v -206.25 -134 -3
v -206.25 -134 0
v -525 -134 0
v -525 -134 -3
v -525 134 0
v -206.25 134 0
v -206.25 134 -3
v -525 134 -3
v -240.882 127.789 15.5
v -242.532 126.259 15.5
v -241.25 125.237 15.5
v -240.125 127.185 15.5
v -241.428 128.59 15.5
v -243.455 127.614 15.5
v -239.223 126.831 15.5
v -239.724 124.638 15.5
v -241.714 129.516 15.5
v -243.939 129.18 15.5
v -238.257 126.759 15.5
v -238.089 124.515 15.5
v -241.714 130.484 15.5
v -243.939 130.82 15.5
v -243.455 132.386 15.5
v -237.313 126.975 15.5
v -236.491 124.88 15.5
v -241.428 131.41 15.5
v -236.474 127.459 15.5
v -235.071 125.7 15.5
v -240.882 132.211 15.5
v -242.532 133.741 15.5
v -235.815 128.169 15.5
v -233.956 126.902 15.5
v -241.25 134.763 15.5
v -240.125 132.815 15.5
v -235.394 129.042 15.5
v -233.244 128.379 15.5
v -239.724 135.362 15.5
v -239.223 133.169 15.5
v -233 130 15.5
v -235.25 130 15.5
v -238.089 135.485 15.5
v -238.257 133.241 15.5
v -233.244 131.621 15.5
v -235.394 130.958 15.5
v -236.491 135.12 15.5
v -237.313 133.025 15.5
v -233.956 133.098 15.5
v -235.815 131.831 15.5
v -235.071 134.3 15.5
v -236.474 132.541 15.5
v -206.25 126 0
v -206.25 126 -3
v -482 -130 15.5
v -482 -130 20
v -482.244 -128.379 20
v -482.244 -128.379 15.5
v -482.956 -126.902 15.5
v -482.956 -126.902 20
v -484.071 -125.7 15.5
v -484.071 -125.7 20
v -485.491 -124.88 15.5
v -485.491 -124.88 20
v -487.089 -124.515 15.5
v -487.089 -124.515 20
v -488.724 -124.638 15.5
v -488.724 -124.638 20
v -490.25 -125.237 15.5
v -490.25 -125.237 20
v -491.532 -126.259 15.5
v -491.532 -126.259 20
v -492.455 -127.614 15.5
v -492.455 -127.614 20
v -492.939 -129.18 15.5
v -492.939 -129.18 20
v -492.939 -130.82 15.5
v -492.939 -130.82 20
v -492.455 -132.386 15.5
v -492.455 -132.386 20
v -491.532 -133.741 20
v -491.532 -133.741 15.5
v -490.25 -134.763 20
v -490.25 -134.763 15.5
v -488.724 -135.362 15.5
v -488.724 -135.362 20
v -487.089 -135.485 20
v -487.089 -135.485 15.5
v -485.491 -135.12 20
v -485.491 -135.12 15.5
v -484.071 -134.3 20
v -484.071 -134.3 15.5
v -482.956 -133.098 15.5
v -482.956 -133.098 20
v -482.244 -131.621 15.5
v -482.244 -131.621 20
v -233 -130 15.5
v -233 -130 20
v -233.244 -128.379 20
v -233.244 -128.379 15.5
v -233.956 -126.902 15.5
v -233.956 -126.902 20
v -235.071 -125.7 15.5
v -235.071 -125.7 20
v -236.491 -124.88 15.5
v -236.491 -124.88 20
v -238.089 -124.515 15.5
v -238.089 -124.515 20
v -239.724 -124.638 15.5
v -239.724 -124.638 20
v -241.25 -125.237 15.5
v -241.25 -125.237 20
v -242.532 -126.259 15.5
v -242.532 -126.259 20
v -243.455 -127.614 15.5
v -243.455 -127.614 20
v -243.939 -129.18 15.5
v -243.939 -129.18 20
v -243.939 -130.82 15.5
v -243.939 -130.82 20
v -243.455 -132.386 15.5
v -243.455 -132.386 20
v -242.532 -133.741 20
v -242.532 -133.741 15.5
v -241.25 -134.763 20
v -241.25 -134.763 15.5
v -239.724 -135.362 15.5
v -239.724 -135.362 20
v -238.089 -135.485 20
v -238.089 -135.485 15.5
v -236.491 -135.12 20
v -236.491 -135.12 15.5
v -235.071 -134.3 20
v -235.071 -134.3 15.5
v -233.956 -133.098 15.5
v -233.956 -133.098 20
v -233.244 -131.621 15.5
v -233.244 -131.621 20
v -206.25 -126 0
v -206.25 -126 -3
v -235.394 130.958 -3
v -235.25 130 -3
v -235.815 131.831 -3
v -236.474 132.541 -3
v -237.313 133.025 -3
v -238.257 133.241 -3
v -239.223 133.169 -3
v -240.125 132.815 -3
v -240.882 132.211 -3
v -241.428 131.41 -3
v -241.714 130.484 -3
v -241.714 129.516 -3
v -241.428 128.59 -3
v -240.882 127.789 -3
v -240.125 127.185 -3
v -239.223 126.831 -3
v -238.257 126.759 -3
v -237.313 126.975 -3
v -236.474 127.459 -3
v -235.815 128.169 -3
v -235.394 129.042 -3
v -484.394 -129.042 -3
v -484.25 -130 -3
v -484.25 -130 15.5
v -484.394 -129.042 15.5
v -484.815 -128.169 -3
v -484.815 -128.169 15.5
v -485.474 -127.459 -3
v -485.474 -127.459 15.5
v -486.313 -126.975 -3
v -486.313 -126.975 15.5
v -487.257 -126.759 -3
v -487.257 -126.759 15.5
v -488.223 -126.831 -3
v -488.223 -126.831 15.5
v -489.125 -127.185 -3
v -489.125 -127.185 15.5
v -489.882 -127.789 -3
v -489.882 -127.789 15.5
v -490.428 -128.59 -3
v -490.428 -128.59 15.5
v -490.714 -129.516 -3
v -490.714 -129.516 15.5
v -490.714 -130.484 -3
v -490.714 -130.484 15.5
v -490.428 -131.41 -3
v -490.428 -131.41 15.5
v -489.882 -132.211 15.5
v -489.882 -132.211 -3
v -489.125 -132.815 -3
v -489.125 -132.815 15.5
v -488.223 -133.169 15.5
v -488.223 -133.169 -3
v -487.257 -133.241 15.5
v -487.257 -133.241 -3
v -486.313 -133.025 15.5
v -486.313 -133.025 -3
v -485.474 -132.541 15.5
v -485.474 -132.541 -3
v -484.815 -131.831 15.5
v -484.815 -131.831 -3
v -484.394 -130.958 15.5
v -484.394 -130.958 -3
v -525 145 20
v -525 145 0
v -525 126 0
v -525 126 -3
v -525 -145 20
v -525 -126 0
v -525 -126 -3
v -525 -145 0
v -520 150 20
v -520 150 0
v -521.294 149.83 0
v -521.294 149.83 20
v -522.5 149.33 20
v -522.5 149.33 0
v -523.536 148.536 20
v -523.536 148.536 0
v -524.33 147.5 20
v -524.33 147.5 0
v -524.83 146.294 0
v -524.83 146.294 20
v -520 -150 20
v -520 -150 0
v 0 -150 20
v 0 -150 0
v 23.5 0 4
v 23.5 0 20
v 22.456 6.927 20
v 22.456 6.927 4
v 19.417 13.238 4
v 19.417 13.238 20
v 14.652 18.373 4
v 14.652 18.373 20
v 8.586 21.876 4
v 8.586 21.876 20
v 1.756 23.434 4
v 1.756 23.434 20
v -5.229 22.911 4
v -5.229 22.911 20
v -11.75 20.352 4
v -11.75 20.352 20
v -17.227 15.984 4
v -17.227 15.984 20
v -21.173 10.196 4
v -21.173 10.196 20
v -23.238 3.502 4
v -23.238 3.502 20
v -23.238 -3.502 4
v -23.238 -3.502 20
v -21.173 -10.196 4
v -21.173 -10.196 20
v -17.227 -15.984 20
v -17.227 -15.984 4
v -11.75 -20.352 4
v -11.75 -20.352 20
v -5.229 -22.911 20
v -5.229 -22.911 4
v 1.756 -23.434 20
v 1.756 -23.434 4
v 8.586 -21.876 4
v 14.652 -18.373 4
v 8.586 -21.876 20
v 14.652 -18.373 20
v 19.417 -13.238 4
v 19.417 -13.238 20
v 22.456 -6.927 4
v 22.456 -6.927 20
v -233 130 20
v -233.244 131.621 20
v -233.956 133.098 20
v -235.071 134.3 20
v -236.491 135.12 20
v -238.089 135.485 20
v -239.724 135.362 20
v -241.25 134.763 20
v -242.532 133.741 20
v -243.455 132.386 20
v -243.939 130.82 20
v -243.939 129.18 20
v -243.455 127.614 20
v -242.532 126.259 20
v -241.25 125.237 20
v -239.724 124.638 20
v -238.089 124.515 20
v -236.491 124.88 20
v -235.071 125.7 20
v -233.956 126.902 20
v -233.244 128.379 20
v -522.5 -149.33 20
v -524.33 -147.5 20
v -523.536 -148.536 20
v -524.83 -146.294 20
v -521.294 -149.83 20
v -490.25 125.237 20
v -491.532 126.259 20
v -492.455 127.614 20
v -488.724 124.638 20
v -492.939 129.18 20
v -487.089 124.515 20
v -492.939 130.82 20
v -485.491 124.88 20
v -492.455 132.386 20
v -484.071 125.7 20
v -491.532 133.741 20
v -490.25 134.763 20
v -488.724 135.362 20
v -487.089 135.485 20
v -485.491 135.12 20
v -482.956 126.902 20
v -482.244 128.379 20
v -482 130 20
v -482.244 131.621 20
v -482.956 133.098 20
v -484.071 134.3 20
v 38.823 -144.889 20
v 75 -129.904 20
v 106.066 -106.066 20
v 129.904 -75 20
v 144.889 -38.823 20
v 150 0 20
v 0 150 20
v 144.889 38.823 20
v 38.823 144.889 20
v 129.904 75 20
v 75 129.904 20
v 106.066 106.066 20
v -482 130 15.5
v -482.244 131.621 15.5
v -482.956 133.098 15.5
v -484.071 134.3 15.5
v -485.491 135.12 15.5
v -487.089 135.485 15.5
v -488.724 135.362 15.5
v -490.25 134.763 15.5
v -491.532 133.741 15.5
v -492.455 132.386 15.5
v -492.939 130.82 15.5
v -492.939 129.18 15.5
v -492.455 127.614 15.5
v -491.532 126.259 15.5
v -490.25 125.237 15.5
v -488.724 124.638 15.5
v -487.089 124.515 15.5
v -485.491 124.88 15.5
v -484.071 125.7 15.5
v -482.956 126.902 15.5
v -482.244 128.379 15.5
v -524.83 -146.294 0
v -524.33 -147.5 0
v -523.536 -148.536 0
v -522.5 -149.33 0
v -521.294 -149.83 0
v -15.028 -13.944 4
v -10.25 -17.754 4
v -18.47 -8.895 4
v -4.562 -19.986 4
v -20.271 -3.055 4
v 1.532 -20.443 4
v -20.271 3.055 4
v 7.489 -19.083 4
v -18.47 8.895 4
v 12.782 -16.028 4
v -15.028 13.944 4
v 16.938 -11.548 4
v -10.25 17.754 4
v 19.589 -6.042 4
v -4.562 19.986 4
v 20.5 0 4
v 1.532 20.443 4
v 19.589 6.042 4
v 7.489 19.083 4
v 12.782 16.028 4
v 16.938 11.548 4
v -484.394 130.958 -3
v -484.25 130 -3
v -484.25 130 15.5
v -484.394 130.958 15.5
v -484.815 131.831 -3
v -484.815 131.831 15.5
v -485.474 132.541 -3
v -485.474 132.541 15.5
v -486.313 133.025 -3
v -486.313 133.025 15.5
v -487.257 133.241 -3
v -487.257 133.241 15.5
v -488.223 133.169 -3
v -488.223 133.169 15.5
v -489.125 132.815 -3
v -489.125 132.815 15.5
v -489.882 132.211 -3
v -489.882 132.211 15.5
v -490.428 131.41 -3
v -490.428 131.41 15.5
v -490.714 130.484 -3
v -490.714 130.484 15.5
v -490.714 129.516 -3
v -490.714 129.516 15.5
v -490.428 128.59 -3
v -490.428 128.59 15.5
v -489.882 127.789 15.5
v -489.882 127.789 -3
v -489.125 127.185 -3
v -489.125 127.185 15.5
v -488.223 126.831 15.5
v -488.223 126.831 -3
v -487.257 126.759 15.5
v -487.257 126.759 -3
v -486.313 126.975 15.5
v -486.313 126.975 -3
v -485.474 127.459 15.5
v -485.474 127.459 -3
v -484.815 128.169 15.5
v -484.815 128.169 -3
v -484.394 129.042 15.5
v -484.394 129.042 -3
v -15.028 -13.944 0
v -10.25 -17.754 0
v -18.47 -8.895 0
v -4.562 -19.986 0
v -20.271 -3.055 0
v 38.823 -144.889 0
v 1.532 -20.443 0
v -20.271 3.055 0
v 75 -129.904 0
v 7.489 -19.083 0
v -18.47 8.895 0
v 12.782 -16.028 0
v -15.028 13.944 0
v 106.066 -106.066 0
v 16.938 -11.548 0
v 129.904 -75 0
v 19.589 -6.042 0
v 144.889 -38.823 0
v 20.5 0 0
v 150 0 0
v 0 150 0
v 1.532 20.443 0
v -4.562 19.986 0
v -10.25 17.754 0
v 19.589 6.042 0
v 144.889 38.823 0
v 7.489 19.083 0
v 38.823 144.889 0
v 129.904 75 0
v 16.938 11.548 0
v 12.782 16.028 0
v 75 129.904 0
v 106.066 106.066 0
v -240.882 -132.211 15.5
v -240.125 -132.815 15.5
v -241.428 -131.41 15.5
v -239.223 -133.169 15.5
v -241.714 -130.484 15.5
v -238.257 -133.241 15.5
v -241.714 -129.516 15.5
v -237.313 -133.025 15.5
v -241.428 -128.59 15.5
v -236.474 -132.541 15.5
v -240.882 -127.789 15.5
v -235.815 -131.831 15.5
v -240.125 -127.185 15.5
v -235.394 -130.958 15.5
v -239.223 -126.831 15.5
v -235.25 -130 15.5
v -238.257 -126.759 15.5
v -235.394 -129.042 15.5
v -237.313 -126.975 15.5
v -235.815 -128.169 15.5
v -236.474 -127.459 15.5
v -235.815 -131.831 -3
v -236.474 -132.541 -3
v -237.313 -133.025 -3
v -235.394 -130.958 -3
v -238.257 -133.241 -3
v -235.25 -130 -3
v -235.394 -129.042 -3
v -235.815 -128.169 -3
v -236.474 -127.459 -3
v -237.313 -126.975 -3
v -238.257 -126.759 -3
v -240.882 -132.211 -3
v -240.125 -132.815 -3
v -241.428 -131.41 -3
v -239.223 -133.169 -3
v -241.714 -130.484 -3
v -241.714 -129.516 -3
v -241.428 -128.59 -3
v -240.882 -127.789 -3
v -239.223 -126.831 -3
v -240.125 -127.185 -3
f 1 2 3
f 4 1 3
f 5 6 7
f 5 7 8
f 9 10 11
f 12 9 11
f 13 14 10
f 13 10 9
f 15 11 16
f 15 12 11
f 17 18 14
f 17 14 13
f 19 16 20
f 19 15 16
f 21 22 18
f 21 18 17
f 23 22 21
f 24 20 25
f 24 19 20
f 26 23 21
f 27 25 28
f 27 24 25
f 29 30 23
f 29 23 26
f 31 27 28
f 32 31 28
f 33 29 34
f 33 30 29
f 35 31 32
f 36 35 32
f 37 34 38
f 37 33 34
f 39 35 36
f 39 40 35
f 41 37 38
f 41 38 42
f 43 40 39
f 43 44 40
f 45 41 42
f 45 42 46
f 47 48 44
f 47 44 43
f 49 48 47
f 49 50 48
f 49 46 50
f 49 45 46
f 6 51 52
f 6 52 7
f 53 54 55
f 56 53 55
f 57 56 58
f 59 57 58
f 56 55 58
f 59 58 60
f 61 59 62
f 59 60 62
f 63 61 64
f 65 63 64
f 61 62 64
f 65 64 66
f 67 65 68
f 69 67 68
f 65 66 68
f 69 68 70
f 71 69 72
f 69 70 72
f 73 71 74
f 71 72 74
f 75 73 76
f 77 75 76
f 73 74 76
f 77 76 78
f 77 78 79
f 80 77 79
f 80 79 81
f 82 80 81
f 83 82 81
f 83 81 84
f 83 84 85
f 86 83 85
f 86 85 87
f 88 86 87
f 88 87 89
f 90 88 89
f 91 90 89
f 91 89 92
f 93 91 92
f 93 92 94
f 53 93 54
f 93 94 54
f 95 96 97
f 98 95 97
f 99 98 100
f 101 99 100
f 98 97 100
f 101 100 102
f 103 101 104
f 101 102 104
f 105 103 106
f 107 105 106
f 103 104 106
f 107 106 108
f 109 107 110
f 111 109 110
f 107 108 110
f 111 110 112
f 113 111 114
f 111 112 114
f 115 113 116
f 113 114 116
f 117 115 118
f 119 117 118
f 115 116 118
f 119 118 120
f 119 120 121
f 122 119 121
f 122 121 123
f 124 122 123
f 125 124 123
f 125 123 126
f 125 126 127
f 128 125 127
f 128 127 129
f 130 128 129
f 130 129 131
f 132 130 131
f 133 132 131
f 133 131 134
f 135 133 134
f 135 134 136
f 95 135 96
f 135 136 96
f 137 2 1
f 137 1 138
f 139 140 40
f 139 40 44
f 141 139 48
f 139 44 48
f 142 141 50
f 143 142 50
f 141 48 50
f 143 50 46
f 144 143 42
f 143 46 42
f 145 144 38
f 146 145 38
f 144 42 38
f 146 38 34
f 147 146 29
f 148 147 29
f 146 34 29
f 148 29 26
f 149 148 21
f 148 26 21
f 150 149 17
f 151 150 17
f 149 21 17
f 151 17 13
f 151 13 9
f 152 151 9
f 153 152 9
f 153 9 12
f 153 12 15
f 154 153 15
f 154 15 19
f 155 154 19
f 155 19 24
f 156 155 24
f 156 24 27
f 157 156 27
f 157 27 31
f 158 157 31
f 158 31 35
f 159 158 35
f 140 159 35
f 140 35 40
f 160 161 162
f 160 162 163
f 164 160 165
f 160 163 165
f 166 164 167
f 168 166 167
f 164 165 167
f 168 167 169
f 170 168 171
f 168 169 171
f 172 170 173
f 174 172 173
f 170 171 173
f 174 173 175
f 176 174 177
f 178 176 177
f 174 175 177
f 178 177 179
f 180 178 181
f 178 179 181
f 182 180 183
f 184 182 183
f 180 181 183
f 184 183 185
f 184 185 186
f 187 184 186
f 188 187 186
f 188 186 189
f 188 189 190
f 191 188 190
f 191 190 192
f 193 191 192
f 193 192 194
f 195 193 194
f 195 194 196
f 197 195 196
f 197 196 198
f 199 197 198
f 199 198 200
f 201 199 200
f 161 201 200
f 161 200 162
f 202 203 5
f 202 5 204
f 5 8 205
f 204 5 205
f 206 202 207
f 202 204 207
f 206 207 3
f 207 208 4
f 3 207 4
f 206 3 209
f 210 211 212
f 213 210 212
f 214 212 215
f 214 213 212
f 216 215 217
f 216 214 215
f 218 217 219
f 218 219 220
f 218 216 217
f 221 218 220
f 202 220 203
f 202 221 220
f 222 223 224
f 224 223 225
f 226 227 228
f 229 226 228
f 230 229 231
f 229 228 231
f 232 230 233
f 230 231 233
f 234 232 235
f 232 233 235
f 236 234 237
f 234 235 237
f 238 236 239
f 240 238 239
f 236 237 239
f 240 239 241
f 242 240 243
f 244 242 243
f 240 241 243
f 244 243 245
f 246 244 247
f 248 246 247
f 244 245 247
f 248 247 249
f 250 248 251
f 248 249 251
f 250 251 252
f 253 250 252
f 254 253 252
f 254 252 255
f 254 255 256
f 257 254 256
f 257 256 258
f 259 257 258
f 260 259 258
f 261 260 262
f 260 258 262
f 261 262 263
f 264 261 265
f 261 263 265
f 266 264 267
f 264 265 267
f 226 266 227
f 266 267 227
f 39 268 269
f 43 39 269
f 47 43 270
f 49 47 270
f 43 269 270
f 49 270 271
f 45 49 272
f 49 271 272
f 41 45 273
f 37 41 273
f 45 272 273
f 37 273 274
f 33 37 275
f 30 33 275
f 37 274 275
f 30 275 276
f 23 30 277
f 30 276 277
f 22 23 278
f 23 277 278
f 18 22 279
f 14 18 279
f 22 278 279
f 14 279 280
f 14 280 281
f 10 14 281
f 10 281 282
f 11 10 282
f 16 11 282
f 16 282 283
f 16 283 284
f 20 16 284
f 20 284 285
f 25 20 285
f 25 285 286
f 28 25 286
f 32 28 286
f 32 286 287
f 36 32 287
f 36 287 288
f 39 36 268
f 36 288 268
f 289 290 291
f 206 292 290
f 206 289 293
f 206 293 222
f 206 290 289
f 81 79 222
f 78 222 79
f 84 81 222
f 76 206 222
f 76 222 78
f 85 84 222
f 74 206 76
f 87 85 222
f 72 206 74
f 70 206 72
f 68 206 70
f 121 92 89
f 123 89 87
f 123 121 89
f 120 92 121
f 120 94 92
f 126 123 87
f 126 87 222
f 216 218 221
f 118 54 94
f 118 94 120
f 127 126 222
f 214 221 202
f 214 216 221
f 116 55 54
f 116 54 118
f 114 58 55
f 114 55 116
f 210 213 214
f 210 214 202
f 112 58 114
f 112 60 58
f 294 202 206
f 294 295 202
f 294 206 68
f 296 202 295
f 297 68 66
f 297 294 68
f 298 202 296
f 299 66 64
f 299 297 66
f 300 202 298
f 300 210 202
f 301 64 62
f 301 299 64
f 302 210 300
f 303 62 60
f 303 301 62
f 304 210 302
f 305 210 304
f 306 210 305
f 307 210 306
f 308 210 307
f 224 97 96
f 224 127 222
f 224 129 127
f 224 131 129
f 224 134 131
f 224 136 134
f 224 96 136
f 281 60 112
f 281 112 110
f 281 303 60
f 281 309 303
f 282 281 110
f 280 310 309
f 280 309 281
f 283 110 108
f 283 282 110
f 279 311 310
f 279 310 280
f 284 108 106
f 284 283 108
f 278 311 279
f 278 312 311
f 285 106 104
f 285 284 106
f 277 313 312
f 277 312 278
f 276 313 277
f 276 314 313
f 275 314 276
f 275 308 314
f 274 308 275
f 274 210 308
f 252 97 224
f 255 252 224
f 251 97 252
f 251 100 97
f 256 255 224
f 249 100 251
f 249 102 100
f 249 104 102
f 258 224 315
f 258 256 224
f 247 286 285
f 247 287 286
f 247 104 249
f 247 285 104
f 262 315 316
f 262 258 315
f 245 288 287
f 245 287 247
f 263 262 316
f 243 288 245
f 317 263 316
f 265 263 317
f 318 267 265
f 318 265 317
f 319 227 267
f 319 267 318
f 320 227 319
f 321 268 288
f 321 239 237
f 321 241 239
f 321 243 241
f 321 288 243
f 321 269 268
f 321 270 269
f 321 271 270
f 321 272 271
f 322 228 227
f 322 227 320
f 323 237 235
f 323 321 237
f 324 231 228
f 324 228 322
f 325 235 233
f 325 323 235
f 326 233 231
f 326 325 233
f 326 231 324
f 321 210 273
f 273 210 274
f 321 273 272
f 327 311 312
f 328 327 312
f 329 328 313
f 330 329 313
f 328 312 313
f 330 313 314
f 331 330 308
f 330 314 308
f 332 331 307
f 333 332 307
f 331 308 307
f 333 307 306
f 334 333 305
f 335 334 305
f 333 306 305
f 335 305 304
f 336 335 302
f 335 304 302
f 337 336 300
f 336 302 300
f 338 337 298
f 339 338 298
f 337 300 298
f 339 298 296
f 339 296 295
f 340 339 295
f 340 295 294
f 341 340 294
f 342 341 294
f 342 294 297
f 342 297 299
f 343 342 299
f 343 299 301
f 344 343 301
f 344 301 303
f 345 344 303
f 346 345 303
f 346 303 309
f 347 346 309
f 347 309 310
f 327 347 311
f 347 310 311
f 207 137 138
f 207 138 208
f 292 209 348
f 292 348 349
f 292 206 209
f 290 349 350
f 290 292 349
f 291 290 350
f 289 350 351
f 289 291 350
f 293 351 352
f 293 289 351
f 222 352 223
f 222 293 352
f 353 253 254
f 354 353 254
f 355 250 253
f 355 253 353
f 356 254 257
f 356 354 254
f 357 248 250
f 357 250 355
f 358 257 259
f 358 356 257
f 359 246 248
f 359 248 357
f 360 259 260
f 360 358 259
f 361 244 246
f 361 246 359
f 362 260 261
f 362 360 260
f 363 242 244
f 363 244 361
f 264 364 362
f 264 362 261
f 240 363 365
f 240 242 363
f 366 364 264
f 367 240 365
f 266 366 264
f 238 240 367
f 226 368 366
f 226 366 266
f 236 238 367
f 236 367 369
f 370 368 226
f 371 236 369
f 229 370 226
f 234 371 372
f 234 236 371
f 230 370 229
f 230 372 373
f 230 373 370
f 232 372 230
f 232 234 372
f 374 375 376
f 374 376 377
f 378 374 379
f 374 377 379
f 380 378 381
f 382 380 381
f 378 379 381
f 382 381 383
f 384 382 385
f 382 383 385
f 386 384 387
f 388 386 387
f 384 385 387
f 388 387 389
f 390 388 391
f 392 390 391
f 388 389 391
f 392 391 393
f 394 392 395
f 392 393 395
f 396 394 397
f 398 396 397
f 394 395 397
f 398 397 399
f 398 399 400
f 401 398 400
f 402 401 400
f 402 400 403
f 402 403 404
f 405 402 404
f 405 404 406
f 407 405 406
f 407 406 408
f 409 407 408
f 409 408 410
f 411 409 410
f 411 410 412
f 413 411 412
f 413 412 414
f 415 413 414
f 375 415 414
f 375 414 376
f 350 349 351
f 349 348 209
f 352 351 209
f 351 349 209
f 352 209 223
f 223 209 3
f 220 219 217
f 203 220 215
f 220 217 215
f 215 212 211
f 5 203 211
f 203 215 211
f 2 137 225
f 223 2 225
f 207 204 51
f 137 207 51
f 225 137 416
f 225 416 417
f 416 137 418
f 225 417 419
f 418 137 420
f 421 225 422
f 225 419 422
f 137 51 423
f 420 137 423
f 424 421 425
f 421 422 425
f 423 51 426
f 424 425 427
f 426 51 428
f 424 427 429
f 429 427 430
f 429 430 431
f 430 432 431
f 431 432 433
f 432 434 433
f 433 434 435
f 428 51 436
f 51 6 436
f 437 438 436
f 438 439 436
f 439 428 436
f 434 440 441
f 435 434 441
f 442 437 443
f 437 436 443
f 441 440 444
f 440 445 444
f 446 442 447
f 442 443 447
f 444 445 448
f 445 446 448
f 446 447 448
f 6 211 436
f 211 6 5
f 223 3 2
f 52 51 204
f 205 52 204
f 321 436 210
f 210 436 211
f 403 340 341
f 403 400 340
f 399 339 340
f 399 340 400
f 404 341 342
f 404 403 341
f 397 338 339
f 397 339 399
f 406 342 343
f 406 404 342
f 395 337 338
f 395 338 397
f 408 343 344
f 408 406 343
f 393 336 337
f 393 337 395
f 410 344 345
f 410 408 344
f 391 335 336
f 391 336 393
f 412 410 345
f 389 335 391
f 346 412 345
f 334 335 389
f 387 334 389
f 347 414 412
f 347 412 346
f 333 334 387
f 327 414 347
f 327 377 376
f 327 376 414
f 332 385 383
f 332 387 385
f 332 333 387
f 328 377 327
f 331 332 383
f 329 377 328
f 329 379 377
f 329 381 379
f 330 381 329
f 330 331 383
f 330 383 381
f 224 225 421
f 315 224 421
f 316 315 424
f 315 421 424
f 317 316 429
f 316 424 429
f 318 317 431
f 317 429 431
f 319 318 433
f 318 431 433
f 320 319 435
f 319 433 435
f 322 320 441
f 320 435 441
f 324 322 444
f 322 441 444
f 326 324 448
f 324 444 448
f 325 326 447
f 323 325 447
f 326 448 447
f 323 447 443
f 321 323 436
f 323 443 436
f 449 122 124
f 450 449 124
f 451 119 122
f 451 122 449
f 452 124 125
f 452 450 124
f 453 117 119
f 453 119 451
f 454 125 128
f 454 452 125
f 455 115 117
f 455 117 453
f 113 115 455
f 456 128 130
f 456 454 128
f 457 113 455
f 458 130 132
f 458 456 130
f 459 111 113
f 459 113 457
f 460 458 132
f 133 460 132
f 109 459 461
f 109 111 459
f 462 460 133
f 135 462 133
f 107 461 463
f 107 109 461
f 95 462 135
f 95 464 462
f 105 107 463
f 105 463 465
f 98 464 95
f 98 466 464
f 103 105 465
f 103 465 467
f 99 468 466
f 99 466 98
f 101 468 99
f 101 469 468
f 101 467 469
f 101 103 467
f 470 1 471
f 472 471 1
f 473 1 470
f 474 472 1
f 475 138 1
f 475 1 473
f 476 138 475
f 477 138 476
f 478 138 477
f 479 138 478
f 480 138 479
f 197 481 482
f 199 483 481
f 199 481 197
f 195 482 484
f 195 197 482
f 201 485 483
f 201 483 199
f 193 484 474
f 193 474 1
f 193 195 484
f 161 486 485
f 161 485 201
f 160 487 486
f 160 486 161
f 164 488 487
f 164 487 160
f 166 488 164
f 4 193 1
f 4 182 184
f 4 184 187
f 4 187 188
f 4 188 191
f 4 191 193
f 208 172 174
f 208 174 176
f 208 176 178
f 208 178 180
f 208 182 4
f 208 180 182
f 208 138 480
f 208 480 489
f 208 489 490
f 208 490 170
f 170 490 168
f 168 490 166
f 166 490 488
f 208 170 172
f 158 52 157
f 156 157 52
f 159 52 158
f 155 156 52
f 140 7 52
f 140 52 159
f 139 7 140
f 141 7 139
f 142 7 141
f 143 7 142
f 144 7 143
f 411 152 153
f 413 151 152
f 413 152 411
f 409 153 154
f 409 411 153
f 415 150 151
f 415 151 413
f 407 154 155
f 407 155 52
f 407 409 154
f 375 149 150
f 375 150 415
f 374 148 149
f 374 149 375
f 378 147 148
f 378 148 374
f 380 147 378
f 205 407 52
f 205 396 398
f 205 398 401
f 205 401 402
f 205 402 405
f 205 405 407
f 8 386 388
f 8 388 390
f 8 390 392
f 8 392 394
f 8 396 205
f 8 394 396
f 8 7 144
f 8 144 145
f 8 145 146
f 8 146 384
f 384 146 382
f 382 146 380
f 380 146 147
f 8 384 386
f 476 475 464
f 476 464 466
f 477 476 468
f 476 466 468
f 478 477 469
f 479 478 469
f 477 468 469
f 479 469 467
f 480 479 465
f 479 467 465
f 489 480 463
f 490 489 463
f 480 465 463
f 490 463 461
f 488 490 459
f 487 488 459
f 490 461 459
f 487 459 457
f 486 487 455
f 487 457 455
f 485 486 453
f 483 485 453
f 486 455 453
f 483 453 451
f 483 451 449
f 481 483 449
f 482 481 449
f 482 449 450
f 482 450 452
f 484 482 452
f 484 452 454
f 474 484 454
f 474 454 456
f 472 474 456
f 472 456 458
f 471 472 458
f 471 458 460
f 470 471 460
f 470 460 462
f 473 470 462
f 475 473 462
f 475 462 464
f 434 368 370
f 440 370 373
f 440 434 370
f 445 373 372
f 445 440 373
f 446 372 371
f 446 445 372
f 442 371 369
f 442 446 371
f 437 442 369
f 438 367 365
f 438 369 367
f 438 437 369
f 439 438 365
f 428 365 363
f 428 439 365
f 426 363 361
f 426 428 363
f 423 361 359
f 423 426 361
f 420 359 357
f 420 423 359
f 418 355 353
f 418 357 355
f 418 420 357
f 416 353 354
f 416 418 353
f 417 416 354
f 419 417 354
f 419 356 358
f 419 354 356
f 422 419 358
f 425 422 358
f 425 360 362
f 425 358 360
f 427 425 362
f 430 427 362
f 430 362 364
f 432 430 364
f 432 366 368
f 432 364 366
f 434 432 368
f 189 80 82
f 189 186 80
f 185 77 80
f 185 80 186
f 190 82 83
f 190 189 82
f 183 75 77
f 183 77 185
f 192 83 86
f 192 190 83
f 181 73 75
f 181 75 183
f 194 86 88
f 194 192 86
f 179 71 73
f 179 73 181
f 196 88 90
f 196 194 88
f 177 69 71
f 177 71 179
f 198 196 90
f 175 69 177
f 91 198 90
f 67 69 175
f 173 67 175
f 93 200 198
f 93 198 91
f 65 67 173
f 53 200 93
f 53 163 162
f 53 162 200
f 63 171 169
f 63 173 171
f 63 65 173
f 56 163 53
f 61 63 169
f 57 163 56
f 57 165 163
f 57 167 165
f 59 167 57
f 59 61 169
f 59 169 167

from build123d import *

# Parameters (mm, degrees)
SKETCH1_R           = 20.5
BOSS_EXTRUDE1_DEPTH = 20
SKETCH2_R           = 23.5
CUT_EXTRUDE1_DEPTH  = 16
SKETCH4_W           = 318.75
SKETCH4_H           = 8
BOSS_EXTRUDE2_DEPTH = 3
SKETCH3_R           = 3.25
CUT_EXTRUDE2_DEPTH  = 547.492451915
SKETCH5_R           = 5.5
CUT_EXTRUDE3_DEPTH  = 4.5
FILLET1_R           = 5


with BuildPart() as part:
    # Sketch1 → Boss-Extrude1 (new body)
    with BuildSketch(Plane.XY):
        with BuildLine():
            Line((0, 150), (-525, 150))
            Line((-525, 150), (-525, -150))
            Line((-525, -150), (0, -150))
            ThreePointArc((0, -150), (150, 0), (0, 150))
        make_face()
        Circle(SKETCH1_R, mode=Mode.SUBTRACT)
    extrude(amount=BOSS_EXTRUDE1_DEPTH)

    # Sketch2 → Cut-Extrude1 (cut)
    with BuildSketch(Plane.XY.offset(20)):
        Circle(SKETCH2_R)
    extrude(amount=-CUT_EXTRUDE1_DEPTH, mode=Mode.SUBTRACT)

    # Sketch4 → Boss-Extrude2 (add)
    with BuildSketch(Plane(origin=(0, 0, 0), x_dir=(-1, 0, 0), z_dir=(0, 0, -1))):
        with Locations((365.625, -130)):
            Rectangle(SKETCH4_W, SKETCH4_H)
        with Locations((365.625, 130)):
            Rectangle(SKETCH4_W, SKETCH4_H)
    extrude(amount=BOSS_EXTRUDE2_DEPTH)

    # Sketch3 → Cut-Extrude2 (cut, through all)
    with BuildSketch(Plane.XY.offset(20)):
        with Locations((-238.5, 130)):
            Circle(SKETCH3_R)
        with Locations((-487.5, 130)):
            Circle(SKETCH3_R)
        with Locations((-487.5, -130)):
            Circle(SKETCH3_R)
        with Locations((-238.5, -130)):
            Circle(SKETCH3_R)
    extrude(amount=-CUT_EXTRUDE2_DEPTH, mode=Mode.SUBTRACT)

    # Sketch5 → Cut-Extrude3 (cut)
    with BuildSketch(Plane.XY.offset(20)):
        with Locations((-487.5, 130)):
            Circle(SKETCH5_R)
        with Locations((-238.5, 130)):
            Circle(SKETCH5_R)
        with Locations((-238.5, -130)):
            Circle(SKETCH5_R)
        with Locations((-487.5, -130)):
            Circle(SKETCH5_R)
    extrude(amount=-CUT_EXTRUDE3_DEPTH, mode=Mode.SUBTRACT)

    # Fillet1
    fillet1_edges = [part.edges().sort_by_distance(p)[0] for p in [
        (-525, -150, 10),
        (-525, 150, 10),
    ]]
    fillet(fillet1_edges, radius=FILLET1_R)


solid = part.part
